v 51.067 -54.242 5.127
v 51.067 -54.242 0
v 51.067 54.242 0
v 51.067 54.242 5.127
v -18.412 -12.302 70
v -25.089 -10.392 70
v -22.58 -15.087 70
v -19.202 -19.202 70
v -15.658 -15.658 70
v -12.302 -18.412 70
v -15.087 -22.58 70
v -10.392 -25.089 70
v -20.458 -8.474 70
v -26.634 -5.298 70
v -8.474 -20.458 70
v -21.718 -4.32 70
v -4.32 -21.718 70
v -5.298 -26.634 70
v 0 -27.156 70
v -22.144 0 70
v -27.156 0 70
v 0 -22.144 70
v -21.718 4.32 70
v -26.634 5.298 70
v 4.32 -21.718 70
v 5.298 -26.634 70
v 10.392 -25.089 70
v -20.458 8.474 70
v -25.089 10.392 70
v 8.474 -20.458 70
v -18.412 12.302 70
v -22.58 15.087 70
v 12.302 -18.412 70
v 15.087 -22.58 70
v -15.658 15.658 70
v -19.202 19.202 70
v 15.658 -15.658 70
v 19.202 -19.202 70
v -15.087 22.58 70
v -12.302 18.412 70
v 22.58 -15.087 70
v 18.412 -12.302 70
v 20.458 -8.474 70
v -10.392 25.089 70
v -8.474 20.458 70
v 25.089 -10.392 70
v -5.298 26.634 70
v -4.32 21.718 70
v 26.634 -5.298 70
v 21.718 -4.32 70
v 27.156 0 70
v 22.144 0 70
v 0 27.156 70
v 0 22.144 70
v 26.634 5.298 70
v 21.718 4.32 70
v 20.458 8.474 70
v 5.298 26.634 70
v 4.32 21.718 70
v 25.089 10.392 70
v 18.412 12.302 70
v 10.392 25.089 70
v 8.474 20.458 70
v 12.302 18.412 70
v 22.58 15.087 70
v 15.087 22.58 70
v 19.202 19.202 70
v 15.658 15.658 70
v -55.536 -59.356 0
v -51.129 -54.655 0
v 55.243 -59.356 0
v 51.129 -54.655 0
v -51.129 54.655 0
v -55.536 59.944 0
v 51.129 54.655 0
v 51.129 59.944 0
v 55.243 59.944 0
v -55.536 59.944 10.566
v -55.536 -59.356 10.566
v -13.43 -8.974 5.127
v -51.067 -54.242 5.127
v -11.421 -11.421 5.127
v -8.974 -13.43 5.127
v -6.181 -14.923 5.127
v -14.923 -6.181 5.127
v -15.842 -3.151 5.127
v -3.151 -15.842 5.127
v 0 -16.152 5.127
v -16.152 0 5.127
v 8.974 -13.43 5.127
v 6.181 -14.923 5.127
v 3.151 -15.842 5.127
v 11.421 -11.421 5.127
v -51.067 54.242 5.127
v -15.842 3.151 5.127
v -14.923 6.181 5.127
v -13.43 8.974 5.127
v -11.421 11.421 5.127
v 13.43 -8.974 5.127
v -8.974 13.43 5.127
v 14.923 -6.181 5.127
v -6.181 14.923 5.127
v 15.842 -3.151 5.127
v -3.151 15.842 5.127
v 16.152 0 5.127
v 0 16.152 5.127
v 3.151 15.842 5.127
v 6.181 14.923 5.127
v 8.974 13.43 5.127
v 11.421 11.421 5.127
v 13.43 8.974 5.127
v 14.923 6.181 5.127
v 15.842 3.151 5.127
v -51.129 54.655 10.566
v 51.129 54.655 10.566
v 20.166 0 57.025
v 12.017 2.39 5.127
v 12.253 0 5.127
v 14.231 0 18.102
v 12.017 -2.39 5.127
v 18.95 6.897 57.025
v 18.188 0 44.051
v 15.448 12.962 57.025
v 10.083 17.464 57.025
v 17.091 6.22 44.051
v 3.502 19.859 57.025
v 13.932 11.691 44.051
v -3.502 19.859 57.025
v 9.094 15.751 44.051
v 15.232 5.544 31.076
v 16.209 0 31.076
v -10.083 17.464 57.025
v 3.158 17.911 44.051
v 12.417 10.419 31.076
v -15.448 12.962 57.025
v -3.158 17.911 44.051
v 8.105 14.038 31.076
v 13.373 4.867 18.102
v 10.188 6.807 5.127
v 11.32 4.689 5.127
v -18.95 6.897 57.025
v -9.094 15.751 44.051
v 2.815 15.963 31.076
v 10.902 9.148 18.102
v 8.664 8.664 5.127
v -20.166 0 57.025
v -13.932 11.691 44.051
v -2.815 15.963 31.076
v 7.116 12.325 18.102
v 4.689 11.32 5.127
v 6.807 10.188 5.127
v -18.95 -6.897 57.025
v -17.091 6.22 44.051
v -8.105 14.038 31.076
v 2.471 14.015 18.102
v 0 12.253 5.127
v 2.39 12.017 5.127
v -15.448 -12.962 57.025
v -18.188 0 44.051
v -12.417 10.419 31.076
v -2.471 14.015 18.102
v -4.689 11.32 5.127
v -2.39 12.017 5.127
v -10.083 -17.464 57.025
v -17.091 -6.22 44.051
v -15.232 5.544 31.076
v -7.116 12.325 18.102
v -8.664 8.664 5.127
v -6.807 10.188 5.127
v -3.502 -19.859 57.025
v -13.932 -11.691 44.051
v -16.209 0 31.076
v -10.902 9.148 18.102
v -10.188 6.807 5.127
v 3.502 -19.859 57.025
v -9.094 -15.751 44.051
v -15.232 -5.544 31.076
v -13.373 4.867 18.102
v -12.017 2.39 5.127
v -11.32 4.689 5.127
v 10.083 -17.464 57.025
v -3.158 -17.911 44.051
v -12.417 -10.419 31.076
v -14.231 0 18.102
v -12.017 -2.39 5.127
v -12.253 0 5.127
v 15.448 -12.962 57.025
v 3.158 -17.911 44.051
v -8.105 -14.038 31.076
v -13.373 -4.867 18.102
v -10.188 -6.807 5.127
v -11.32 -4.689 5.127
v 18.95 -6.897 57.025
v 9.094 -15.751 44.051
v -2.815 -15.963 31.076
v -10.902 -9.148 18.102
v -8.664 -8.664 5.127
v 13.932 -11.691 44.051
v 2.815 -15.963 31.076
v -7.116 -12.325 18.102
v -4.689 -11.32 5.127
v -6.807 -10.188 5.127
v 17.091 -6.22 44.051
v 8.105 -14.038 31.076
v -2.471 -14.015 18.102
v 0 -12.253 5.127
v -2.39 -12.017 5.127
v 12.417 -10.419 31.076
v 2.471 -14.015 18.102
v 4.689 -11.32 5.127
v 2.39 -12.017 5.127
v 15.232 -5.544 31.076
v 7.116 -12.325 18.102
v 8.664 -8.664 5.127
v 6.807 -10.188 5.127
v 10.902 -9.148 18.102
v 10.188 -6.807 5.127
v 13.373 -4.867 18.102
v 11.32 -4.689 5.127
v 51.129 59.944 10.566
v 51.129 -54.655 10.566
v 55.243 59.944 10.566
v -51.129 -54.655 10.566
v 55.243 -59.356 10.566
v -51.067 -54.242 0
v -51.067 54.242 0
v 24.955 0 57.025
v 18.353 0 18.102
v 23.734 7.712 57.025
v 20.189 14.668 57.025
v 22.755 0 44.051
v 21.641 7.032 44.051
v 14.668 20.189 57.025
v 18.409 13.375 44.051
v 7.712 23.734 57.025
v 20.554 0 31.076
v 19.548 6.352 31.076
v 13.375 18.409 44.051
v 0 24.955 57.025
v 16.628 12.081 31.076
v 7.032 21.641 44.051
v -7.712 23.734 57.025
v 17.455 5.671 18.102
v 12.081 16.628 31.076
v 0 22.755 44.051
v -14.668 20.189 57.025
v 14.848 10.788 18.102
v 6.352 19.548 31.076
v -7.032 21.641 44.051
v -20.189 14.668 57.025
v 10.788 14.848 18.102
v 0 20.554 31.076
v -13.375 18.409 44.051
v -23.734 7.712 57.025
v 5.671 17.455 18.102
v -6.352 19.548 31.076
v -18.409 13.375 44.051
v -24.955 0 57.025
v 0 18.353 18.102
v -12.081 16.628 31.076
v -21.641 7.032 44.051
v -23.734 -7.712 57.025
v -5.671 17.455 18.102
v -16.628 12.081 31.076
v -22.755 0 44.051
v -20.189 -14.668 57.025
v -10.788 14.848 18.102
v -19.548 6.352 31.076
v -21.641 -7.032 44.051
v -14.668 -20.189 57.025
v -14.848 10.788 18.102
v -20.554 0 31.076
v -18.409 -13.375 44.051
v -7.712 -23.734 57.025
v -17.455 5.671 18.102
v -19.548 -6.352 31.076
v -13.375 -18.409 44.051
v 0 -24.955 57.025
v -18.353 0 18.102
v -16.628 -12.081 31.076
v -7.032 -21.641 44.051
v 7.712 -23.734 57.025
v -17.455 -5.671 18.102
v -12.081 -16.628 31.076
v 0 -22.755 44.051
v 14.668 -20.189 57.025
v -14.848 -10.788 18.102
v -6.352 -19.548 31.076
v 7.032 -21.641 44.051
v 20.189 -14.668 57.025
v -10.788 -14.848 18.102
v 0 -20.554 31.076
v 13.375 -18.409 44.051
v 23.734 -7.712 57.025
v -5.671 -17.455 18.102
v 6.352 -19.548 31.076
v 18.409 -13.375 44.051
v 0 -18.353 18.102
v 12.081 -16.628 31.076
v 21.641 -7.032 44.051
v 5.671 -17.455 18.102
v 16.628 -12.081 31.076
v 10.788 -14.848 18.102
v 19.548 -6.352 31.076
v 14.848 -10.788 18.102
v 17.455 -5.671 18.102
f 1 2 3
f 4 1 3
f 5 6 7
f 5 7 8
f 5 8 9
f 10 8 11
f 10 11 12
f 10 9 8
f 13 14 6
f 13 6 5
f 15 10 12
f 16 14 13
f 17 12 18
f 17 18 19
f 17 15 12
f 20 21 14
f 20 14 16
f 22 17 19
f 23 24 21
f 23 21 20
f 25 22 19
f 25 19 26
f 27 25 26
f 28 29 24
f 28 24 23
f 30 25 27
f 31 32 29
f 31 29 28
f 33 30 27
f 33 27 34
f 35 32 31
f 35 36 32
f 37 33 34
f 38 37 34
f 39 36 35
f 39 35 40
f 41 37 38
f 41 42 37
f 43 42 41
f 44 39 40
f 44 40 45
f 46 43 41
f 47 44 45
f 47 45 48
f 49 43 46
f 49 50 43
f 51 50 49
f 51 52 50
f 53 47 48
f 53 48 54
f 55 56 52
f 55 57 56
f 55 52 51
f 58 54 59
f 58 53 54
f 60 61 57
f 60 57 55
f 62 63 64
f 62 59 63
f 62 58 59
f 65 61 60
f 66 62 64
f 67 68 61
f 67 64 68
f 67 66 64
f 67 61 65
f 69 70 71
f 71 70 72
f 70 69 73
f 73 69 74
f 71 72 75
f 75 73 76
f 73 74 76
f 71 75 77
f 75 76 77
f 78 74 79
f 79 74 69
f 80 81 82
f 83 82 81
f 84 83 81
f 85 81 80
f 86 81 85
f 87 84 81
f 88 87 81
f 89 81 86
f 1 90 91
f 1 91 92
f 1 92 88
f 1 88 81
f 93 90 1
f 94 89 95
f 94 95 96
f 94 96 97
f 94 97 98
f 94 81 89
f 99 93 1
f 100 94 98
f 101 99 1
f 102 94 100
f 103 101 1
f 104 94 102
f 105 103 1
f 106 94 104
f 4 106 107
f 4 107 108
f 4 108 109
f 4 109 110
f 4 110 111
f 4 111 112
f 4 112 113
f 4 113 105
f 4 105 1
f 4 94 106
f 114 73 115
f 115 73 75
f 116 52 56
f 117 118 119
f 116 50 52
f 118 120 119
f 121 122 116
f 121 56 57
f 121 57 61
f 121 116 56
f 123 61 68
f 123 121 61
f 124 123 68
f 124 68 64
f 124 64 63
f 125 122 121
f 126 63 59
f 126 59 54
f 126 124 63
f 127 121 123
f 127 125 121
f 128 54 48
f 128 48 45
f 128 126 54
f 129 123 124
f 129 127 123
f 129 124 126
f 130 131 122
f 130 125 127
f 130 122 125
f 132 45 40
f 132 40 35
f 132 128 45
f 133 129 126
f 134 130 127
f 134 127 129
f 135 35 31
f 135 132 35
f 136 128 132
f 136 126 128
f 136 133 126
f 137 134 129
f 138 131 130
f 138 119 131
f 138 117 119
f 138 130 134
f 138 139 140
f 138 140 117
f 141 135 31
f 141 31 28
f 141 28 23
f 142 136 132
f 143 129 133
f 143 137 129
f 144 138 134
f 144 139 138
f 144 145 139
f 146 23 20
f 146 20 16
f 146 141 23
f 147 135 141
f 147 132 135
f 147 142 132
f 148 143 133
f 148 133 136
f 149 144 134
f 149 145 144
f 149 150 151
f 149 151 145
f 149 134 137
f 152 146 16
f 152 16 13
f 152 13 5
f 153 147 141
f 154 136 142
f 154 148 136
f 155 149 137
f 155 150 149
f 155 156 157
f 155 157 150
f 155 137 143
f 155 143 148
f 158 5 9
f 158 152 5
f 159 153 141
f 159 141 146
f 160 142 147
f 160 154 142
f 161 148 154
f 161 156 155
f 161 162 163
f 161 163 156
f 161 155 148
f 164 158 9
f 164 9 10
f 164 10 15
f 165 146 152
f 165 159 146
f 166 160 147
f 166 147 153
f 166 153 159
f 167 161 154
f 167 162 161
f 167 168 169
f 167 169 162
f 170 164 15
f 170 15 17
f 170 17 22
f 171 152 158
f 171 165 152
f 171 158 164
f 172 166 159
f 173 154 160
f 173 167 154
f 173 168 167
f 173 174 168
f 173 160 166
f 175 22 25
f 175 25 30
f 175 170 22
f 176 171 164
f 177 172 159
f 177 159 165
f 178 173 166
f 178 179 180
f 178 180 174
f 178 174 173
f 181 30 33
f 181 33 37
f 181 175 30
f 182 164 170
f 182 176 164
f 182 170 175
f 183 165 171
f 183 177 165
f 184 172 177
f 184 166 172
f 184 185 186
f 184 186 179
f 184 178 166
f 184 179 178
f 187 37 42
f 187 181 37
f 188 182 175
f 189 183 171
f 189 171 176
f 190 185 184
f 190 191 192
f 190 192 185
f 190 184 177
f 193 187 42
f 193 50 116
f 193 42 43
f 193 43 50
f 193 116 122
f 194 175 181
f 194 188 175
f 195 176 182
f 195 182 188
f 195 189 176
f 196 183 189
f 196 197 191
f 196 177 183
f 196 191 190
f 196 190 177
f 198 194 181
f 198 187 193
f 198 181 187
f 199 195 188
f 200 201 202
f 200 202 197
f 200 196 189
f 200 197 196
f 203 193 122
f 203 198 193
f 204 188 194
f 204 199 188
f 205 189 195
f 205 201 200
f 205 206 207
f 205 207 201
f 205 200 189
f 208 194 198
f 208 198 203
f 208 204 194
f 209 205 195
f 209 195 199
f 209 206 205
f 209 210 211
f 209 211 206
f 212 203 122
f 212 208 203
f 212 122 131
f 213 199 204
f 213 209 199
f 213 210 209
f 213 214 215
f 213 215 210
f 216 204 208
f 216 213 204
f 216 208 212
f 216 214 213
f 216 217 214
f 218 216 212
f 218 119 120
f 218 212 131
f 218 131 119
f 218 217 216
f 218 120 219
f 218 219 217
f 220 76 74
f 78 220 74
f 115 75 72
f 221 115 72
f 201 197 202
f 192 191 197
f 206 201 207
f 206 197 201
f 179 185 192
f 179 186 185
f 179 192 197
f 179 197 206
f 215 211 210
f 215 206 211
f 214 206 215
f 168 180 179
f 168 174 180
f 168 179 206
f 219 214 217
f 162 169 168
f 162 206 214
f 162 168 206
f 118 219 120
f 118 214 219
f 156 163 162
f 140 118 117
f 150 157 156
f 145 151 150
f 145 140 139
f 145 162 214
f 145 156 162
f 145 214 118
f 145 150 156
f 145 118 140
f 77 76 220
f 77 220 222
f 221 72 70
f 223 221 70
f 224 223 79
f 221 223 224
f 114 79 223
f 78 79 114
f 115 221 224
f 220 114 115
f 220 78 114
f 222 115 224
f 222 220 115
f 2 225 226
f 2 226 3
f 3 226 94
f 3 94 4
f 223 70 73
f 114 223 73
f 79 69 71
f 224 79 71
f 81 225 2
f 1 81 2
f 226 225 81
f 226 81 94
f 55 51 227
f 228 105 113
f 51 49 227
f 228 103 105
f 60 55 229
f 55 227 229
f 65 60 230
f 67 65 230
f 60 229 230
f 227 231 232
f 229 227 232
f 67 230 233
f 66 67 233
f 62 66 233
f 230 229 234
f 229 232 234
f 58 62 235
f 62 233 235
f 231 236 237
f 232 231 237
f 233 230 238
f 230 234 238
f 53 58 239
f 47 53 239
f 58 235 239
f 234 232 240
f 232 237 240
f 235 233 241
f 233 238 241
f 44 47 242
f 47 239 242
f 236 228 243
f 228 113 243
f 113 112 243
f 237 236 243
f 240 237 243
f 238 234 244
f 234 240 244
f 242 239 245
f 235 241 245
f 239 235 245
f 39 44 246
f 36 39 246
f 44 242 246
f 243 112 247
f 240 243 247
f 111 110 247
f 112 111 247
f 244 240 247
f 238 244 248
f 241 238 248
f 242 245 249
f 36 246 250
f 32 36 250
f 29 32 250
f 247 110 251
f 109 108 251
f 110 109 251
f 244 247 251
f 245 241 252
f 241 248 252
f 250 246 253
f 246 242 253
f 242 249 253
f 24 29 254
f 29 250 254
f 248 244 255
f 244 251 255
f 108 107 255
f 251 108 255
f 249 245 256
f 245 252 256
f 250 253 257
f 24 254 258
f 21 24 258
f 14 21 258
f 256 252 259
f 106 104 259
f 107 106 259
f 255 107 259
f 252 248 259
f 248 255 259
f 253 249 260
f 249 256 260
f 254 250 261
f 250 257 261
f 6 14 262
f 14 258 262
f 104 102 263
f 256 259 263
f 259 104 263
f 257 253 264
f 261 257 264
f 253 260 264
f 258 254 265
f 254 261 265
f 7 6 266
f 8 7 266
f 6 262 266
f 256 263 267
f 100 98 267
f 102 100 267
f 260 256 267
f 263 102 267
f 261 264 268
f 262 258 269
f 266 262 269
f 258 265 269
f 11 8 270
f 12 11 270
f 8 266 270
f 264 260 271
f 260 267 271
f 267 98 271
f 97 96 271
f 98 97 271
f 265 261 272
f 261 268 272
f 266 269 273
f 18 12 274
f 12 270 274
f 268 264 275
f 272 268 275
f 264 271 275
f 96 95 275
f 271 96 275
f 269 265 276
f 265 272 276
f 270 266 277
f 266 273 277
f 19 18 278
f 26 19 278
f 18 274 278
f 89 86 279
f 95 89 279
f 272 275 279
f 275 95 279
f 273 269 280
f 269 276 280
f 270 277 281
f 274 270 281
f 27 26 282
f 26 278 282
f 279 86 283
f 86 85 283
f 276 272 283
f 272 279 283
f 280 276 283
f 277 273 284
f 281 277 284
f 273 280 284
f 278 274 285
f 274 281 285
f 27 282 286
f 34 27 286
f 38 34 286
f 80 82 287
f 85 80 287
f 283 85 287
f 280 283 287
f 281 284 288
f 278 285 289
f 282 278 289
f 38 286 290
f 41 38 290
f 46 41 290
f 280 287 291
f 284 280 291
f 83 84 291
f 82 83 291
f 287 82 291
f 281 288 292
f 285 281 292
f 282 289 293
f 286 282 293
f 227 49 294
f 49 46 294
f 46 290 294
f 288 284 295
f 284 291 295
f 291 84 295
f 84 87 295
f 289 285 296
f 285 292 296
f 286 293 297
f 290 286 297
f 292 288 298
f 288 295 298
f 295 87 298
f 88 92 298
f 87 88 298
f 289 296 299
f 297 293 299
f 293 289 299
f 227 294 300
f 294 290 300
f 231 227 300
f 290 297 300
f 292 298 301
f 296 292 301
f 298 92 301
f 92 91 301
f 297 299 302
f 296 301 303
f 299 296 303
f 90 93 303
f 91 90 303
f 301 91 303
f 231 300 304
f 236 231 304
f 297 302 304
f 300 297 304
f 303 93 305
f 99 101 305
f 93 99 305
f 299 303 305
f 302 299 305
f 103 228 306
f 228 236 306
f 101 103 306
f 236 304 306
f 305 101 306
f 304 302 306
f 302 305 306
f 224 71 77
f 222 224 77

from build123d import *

# Parameters (mm, degrees)
F2_R     = 27.156272
F0_R     = 15.282677
F0_W     = 4.407648
F0_H     = 109.30971
F0_W_2   = 4.113804
F0_H_2   = 5.289179
F4_DEPTH = 10.566
F5_R     = 22.143886
F6_R     = 11.471195
F8_W     = 102.133096
F8_H     = 108.483352
F9_DEPTH = 5.12726


with BuildPart() as f3:
    # F2 (on offset) → F3 section 0
    with BuildSketch(Plane.XY.offset(70)):
        Circle(F2_R)
    # F0 (on Top) → F3 section 1
    with BuildSketch(Plane.XY):
        Circle(F0_R)
    loft()

    # F5 (on face) → F7 section 0
    with BuildSketch(Plane.XY.offset(70)):
        Circle(F5_R)
    # F6 (on Top) → F7 section 1
    with BuildSketch(Plane.XY):
        Circle(F6_R)
    loft(mode=Mode.SUBTRACT)

    # F8 (on Top) → F9 (join)
    with BuildSketch(Plane.XY):
        Rectangle(F8_W, F8_H)
    extrude(amount=F9_DEPTH)


with BuildPart() as f4:
    # F0 (on Top) → F4 (new body)
    with BuildSketch(Plane.XY):
        Polygon((-55.536382, 54.654855), (-51.128734, 54.654855), (51.128734, 54.654855), (51.128734, 59.944034), (-55.536382, 59.944034), align=None)
        with Locations((-53.332558, 0)):
            Rectangle(F0_W, F0_H)
        Polygon((55.242538, 54.654855), (51.128734, 54.654855), (51.128734, -54.654855), (51.128734, -59.356347), (55.242538, -59.356347), align=None)
        with Locations((53.185636, 57.299444)):
            Rectangle(F0_W_2, F0_H_2)
        Polygon((51.128734, -54.654855), (-51.128734, -54.654855), (-55.536382, -54.654855), (-55.536382, -59.356347), (51.128734, -59.356347), align=None)
    extrude(amount=F4_DEPTH)


solid = Compound([f3.part, f4.part])
